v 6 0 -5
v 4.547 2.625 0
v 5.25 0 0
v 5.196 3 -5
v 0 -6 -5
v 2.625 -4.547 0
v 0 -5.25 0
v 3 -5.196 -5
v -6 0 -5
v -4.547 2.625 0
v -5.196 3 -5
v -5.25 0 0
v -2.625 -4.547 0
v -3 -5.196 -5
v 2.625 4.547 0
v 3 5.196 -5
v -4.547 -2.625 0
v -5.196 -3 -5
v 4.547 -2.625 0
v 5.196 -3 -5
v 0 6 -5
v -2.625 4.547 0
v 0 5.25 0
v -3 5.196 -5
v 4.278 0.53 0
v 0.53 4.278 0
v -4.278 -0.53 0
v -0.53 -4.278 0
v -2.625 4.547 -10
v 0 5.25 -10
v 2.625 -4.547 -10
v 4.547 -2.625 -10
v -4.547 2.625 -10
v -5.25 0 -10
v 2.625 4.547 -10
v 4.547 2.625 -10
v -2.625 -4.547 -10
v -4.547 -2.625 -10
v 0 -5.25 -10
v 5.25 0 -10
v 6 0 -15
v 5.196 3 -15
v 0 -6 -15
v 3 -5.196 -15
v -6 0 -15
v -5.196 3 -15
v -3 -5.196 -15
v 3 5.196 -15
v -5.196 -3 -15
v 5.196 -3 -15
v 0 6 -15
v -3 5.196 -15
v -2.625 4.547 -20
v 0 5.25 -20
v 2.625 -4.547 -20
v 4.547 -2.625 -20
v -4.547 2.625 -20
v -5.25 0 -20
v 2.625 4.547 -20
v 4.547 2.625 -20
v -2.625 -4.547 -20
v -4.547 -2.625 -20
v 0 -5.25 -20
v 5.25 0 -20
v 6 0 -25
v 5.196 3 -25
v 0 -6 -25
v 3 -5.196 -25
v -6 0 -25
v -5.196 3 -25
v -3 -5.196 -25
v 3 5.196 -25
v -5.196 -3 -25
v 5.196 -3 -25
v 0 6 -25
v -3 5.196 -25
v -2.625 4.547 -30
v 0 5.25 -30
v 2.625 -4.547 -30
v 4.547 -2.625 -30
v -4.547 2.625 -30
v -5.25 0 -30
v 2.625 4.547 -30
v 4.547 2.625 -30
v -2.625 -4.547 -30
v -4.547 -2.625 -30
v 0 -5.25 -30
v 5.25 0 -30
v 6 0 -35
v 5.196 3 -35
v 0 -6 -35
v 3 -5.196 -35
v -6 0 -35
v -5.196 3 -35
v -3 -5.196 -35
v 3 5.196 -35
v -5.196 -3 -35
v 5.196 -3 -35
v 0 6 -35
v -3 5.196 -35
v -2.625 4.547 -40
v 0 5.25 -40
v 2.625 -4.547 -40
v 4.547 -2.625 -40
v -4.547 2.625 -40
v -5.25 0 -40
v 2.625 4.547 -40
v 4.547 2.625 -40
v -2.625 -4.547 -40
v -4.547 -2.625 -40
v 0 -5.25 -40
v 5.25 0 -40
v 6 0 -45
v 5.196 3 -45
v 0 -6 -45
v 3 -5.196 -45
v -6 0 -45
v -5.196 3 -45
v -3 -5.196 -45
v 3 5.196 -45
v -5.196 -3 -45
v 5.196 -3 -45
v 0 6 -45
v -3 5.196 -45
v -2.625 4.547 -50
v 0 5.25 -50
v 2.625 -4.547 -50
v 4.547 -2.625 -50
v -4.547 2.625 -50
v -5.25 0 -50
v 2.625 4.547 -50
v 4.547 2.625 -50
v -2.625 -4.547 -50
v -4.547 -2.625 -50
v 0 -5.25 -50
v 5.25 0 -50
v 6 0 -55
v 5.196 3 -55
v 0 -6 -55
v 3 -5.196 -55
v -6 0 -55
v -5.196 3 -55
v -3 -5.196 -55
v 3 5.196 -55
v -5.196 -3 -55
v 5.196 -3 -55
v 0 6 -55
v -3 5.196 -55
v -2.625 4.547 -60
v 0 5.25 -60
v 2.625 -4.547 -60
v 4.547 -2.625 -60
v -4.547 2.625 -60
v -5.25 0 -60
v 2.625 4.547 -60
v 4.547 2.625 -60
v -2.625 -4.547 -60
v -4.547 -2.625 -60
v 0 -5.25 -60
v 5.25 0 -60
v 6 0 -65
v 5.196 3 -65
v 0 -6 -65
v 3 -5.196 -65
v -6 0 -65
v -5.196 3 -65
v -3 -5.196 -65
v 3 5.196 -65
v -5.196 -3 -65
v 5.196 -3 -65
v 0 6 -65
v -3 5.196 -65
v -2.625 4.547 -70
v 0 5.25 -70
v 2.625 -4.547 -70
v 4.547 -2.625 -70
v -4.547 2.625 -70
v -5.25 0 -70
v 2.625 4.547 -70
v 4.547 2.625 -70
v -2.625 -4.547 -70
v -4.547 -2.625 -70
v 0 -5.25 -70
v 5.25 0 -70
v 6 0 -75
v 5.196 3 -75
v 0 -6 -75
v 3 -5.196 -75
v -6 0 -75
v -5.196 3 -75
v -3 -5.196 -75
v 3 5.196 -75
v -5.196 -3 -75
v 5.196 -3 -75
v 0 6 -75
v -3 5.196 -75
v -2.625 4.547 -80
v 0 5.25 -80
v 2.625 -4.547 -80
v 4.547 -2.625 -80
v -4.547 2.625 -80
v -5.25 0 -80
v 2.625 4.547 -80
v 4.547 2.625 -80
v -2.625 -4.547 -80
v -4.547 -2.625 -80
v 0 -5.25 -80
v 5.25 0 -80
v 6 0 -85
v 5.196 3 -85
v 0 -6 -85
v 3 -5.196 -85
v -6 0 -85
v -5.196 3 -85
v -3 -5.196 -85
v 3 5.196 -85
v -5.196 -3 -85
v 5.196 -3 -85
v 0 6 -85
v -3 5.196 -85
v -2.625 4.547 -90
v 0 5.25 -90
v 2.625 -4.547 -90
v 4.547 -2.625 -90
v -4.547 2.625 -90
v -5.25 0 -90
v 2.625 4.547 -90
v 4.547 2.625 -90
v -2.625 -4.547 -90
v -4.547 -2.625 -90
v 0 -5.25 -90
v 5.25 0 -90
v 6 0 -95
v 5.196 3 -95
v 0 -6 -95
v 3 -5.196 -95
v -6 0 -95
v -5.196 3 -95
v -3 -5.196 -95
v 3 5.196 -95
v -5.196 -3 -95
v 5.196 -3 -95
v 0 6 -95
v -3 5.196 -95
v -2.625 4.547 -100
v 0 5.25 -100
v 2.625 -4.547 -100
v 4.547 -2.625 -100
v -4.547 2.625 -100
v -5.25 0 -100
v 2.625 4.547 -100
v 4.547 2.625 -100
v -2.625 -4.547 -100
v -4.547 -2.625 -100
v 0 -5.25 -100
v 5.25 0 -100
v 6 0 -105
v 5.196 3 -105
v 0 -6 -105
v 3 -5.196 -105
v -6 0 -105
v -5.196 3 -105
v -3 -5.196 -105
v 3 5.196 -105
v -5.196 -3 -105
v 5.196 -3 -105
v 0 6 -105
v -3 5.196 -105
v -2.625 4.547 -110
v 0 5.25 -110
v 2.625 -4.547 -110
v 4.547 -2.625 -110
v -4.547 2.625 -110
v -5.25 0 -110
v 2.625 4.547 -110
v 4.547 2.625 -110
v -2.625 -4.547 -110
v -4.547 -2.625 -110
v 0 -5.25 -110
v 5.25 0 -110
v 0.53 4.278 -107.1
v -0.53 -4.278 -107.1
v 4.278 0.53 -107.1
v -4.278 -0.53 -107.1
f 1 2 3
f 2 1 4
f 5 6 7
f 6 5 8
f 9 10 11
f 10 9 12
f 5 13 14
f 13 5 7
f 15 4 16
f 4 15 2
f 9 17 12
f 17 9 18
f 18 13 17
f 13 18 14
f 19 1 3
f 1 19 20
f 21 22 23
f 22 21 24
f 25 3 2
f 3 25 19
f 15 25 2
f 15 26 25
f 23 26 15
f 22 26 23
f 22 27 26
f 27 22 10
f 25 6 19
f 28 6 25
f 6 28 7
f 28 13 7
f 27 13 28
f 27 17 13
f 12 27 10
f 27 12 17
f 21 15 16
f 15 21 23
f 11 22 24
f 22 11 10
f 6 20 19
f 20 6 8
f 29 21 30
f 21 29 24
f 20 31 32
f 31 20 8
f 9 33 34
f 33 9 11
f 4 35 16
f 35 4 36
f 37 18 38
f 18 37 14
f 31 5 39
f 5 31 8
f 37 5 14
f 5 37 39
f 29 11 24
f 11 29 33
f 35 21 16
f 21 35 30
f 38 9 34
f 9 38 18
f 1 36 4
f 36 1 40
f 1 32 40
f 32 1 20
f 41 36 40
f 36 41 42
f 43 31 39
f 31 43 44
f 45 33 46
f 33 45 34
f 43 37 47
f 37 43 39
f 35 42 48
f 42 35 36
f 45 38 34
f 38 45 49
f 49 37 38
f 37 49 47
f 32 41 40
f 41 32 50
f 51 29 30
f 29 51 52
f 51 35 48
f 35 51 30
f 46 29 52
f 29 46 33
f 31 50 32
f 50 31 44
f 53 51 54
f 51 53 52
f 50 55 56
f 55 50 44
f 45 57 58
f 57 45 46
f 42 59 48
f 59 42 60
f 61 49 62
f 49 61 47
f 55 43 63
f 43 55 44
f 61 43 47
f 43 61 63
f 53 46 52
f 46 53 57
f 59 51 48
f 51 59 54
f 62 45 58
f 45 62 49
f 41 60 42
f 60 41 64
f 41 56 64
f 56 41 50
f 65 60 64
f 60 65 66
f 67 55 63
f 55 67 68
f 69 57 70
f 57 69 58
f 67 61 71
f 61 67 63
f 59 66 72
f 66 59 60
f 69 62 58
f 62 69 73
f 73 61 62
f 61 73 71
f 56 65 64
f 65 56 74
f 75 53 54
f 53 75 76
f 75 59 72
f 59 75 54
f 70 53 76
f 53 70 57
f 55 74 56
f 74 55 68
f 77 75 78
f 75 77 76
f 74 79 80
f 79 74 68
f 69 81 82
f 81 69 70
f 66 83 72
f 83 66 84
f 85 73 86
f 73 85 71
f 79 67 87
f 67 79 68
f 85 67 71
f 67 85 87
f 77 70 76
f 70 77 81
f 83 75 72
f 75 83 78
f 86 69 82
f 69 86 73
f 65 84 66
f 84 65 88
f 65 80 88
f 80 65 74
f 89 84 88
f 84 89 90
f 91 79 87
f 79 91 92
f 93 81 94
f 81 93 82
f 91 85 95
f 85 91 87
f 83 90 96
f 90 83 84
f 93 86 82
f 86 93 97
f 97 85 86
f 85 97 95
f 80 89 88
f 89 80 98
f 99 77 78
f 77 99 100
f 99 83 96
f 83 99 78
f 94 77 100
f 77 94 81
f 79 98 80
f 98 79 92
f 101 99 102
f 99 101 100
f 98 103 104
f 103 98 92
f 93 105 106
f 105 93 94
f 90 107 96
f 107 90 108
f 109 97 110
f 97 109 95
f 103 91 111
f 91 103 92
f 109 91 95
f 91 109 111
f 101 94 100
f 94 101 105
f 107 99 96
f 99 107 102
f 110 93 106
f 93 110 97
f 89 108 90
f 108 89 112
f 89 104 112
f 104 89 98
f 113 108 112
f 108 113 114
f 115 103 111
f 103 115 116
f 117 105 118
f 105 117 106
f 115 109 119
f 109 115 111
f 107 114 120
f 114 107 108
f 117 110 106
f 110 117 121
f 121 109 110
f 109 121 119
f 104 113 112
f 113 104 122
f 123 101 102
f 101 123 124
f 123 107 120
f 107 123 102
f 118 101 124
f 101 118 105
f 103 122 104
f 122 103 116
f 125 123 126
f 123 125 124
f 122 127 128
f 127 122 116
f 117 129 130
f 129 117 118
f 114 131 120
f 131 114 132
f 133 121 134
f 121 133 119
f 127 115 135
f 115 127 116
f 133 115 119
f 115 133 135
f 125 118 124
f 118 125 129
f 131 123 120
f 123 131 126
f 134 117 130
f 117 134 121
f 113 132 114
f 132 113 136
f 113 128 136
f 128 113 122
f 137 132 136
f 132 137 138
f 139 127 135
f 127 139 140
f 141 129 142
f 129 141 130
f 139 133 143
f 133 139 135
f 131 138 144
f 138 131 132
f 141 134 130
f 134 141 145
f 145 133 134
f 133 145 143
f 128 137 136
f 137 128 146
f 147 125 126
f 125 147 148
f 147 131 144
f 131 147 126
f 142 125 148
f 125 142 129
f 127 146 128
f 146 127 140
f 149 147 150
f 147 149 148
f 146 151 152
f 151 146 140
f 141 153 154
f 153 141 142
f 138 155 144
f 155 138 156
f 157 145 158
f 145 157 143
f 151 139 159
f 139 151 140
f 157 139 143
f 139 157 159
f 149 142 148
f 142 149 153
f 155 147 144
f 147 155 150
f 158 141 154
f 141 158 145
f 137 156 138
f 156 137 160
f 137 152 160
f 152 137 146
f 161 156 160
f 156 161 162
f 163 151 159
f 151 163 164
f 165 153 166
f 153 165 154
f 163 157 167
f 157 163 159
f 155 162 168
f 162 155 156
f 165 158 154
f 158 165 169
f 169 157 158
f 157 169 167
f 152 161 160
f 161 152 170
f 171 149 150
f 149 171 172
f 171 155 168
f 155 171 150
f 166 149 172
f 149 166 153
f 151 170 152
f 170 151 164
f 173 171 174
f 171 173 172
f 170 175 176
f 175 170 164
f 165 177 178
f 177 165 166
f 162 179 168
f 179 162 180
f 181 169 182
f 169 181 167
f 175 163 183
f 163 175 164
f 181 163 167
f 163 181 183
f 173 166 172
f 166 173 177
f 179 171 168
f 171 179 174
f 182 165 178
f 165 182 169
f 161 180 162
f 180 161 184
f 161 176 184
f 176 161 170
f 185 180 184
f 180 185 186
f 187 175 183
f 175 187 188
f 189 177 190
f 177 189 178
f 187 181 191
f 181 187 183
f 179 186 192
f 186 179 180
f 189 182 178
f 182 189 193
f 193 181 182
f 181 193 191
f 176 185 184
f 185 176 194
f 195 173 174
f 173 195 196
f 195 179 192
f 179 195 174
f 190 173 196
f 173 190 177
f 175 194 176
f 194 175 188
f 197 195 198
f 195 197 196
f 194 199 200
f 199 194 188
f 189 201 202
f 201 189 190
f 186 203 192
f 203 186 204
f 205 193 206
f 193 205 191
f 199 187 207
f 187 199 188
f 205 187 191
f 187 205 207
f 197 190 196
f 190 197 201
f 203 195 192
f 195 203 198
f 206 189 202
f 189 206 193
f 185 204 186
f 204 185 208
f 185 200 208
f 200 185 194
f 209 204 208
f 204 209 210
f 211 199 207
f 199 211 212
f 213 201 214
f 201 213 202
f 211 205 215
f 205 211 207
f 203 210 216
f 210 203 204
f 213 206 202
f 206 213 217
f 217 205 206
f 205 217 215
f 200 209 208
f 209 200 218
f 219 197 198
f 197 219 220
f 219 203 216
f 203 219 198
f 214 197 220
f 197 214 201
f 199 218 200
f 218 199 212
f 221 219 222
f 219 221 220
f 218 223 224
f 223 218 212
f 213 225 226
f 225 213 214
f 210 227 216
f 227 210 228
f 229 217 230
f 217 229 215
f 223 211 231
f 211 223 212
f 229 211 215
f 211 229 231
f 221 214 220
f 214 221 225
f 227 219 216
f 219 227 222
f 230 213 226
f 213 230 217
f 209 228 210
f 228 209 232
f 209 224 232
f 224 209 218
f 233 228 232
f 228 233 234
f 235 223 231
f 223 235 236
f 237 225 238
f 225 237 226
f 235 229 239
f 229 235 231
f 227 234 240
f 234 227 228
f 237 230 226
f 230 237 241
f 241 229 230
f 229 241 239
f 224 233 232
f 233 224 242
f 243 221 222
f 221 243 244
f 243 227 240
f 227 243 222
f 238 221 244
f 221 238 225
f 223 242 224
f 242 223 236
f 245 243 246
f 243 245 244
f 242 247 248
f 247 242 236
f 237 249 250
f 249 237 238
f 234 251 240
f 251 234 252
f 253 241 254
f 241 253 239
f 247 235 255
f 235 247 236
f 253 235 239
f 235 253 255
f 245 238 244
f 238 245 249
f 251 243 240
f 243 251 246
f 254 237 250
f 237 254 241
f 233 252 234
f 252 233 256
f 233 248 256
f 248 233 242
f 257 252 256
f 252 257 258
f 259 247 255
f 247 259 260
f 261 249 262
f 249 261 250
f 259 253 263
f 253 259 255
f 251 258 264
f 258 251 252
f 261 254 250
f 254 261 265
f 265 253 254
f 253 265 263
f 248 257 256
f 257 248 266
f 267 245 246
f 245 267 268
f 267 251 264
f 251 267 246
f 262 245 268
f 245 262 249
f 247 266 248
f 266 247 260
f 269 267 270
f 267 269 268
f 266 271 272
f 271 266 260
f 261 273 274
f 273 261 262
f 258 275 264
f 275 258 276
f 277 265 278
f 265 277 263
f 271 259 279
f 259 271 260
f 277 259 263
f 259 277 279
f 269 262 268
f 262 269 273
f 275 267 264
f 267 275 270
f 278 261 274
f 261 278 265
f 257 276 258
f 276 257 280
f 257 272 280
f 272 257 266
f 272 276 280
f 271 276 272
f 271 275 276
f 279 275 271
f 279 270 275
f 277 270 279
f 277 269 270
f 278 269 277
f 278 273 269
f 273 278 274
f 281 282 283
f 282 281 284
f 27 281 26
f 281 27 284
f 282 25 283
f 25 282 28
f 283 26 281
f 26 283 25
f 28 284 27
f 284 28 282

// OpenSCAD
$fn=12;
rotate([0,180,0])
difference(){
    union(){
        for(i = [0:10]){
            height = 10;
            translate([0,0,height*i])
        seg(12,10.5,height);
        }
    }
    translate([0,0,107.1/2])
    rotate([0,0,45])
    cube([5.3,6.8,107.1],center=true);

}

module seg(b,s,he){
    cylinder(d1=s,d2=b,h=he/2);
    translate([0,0,he/2])
    cylinder(d1=b,d2=s,h=he/2);
}
